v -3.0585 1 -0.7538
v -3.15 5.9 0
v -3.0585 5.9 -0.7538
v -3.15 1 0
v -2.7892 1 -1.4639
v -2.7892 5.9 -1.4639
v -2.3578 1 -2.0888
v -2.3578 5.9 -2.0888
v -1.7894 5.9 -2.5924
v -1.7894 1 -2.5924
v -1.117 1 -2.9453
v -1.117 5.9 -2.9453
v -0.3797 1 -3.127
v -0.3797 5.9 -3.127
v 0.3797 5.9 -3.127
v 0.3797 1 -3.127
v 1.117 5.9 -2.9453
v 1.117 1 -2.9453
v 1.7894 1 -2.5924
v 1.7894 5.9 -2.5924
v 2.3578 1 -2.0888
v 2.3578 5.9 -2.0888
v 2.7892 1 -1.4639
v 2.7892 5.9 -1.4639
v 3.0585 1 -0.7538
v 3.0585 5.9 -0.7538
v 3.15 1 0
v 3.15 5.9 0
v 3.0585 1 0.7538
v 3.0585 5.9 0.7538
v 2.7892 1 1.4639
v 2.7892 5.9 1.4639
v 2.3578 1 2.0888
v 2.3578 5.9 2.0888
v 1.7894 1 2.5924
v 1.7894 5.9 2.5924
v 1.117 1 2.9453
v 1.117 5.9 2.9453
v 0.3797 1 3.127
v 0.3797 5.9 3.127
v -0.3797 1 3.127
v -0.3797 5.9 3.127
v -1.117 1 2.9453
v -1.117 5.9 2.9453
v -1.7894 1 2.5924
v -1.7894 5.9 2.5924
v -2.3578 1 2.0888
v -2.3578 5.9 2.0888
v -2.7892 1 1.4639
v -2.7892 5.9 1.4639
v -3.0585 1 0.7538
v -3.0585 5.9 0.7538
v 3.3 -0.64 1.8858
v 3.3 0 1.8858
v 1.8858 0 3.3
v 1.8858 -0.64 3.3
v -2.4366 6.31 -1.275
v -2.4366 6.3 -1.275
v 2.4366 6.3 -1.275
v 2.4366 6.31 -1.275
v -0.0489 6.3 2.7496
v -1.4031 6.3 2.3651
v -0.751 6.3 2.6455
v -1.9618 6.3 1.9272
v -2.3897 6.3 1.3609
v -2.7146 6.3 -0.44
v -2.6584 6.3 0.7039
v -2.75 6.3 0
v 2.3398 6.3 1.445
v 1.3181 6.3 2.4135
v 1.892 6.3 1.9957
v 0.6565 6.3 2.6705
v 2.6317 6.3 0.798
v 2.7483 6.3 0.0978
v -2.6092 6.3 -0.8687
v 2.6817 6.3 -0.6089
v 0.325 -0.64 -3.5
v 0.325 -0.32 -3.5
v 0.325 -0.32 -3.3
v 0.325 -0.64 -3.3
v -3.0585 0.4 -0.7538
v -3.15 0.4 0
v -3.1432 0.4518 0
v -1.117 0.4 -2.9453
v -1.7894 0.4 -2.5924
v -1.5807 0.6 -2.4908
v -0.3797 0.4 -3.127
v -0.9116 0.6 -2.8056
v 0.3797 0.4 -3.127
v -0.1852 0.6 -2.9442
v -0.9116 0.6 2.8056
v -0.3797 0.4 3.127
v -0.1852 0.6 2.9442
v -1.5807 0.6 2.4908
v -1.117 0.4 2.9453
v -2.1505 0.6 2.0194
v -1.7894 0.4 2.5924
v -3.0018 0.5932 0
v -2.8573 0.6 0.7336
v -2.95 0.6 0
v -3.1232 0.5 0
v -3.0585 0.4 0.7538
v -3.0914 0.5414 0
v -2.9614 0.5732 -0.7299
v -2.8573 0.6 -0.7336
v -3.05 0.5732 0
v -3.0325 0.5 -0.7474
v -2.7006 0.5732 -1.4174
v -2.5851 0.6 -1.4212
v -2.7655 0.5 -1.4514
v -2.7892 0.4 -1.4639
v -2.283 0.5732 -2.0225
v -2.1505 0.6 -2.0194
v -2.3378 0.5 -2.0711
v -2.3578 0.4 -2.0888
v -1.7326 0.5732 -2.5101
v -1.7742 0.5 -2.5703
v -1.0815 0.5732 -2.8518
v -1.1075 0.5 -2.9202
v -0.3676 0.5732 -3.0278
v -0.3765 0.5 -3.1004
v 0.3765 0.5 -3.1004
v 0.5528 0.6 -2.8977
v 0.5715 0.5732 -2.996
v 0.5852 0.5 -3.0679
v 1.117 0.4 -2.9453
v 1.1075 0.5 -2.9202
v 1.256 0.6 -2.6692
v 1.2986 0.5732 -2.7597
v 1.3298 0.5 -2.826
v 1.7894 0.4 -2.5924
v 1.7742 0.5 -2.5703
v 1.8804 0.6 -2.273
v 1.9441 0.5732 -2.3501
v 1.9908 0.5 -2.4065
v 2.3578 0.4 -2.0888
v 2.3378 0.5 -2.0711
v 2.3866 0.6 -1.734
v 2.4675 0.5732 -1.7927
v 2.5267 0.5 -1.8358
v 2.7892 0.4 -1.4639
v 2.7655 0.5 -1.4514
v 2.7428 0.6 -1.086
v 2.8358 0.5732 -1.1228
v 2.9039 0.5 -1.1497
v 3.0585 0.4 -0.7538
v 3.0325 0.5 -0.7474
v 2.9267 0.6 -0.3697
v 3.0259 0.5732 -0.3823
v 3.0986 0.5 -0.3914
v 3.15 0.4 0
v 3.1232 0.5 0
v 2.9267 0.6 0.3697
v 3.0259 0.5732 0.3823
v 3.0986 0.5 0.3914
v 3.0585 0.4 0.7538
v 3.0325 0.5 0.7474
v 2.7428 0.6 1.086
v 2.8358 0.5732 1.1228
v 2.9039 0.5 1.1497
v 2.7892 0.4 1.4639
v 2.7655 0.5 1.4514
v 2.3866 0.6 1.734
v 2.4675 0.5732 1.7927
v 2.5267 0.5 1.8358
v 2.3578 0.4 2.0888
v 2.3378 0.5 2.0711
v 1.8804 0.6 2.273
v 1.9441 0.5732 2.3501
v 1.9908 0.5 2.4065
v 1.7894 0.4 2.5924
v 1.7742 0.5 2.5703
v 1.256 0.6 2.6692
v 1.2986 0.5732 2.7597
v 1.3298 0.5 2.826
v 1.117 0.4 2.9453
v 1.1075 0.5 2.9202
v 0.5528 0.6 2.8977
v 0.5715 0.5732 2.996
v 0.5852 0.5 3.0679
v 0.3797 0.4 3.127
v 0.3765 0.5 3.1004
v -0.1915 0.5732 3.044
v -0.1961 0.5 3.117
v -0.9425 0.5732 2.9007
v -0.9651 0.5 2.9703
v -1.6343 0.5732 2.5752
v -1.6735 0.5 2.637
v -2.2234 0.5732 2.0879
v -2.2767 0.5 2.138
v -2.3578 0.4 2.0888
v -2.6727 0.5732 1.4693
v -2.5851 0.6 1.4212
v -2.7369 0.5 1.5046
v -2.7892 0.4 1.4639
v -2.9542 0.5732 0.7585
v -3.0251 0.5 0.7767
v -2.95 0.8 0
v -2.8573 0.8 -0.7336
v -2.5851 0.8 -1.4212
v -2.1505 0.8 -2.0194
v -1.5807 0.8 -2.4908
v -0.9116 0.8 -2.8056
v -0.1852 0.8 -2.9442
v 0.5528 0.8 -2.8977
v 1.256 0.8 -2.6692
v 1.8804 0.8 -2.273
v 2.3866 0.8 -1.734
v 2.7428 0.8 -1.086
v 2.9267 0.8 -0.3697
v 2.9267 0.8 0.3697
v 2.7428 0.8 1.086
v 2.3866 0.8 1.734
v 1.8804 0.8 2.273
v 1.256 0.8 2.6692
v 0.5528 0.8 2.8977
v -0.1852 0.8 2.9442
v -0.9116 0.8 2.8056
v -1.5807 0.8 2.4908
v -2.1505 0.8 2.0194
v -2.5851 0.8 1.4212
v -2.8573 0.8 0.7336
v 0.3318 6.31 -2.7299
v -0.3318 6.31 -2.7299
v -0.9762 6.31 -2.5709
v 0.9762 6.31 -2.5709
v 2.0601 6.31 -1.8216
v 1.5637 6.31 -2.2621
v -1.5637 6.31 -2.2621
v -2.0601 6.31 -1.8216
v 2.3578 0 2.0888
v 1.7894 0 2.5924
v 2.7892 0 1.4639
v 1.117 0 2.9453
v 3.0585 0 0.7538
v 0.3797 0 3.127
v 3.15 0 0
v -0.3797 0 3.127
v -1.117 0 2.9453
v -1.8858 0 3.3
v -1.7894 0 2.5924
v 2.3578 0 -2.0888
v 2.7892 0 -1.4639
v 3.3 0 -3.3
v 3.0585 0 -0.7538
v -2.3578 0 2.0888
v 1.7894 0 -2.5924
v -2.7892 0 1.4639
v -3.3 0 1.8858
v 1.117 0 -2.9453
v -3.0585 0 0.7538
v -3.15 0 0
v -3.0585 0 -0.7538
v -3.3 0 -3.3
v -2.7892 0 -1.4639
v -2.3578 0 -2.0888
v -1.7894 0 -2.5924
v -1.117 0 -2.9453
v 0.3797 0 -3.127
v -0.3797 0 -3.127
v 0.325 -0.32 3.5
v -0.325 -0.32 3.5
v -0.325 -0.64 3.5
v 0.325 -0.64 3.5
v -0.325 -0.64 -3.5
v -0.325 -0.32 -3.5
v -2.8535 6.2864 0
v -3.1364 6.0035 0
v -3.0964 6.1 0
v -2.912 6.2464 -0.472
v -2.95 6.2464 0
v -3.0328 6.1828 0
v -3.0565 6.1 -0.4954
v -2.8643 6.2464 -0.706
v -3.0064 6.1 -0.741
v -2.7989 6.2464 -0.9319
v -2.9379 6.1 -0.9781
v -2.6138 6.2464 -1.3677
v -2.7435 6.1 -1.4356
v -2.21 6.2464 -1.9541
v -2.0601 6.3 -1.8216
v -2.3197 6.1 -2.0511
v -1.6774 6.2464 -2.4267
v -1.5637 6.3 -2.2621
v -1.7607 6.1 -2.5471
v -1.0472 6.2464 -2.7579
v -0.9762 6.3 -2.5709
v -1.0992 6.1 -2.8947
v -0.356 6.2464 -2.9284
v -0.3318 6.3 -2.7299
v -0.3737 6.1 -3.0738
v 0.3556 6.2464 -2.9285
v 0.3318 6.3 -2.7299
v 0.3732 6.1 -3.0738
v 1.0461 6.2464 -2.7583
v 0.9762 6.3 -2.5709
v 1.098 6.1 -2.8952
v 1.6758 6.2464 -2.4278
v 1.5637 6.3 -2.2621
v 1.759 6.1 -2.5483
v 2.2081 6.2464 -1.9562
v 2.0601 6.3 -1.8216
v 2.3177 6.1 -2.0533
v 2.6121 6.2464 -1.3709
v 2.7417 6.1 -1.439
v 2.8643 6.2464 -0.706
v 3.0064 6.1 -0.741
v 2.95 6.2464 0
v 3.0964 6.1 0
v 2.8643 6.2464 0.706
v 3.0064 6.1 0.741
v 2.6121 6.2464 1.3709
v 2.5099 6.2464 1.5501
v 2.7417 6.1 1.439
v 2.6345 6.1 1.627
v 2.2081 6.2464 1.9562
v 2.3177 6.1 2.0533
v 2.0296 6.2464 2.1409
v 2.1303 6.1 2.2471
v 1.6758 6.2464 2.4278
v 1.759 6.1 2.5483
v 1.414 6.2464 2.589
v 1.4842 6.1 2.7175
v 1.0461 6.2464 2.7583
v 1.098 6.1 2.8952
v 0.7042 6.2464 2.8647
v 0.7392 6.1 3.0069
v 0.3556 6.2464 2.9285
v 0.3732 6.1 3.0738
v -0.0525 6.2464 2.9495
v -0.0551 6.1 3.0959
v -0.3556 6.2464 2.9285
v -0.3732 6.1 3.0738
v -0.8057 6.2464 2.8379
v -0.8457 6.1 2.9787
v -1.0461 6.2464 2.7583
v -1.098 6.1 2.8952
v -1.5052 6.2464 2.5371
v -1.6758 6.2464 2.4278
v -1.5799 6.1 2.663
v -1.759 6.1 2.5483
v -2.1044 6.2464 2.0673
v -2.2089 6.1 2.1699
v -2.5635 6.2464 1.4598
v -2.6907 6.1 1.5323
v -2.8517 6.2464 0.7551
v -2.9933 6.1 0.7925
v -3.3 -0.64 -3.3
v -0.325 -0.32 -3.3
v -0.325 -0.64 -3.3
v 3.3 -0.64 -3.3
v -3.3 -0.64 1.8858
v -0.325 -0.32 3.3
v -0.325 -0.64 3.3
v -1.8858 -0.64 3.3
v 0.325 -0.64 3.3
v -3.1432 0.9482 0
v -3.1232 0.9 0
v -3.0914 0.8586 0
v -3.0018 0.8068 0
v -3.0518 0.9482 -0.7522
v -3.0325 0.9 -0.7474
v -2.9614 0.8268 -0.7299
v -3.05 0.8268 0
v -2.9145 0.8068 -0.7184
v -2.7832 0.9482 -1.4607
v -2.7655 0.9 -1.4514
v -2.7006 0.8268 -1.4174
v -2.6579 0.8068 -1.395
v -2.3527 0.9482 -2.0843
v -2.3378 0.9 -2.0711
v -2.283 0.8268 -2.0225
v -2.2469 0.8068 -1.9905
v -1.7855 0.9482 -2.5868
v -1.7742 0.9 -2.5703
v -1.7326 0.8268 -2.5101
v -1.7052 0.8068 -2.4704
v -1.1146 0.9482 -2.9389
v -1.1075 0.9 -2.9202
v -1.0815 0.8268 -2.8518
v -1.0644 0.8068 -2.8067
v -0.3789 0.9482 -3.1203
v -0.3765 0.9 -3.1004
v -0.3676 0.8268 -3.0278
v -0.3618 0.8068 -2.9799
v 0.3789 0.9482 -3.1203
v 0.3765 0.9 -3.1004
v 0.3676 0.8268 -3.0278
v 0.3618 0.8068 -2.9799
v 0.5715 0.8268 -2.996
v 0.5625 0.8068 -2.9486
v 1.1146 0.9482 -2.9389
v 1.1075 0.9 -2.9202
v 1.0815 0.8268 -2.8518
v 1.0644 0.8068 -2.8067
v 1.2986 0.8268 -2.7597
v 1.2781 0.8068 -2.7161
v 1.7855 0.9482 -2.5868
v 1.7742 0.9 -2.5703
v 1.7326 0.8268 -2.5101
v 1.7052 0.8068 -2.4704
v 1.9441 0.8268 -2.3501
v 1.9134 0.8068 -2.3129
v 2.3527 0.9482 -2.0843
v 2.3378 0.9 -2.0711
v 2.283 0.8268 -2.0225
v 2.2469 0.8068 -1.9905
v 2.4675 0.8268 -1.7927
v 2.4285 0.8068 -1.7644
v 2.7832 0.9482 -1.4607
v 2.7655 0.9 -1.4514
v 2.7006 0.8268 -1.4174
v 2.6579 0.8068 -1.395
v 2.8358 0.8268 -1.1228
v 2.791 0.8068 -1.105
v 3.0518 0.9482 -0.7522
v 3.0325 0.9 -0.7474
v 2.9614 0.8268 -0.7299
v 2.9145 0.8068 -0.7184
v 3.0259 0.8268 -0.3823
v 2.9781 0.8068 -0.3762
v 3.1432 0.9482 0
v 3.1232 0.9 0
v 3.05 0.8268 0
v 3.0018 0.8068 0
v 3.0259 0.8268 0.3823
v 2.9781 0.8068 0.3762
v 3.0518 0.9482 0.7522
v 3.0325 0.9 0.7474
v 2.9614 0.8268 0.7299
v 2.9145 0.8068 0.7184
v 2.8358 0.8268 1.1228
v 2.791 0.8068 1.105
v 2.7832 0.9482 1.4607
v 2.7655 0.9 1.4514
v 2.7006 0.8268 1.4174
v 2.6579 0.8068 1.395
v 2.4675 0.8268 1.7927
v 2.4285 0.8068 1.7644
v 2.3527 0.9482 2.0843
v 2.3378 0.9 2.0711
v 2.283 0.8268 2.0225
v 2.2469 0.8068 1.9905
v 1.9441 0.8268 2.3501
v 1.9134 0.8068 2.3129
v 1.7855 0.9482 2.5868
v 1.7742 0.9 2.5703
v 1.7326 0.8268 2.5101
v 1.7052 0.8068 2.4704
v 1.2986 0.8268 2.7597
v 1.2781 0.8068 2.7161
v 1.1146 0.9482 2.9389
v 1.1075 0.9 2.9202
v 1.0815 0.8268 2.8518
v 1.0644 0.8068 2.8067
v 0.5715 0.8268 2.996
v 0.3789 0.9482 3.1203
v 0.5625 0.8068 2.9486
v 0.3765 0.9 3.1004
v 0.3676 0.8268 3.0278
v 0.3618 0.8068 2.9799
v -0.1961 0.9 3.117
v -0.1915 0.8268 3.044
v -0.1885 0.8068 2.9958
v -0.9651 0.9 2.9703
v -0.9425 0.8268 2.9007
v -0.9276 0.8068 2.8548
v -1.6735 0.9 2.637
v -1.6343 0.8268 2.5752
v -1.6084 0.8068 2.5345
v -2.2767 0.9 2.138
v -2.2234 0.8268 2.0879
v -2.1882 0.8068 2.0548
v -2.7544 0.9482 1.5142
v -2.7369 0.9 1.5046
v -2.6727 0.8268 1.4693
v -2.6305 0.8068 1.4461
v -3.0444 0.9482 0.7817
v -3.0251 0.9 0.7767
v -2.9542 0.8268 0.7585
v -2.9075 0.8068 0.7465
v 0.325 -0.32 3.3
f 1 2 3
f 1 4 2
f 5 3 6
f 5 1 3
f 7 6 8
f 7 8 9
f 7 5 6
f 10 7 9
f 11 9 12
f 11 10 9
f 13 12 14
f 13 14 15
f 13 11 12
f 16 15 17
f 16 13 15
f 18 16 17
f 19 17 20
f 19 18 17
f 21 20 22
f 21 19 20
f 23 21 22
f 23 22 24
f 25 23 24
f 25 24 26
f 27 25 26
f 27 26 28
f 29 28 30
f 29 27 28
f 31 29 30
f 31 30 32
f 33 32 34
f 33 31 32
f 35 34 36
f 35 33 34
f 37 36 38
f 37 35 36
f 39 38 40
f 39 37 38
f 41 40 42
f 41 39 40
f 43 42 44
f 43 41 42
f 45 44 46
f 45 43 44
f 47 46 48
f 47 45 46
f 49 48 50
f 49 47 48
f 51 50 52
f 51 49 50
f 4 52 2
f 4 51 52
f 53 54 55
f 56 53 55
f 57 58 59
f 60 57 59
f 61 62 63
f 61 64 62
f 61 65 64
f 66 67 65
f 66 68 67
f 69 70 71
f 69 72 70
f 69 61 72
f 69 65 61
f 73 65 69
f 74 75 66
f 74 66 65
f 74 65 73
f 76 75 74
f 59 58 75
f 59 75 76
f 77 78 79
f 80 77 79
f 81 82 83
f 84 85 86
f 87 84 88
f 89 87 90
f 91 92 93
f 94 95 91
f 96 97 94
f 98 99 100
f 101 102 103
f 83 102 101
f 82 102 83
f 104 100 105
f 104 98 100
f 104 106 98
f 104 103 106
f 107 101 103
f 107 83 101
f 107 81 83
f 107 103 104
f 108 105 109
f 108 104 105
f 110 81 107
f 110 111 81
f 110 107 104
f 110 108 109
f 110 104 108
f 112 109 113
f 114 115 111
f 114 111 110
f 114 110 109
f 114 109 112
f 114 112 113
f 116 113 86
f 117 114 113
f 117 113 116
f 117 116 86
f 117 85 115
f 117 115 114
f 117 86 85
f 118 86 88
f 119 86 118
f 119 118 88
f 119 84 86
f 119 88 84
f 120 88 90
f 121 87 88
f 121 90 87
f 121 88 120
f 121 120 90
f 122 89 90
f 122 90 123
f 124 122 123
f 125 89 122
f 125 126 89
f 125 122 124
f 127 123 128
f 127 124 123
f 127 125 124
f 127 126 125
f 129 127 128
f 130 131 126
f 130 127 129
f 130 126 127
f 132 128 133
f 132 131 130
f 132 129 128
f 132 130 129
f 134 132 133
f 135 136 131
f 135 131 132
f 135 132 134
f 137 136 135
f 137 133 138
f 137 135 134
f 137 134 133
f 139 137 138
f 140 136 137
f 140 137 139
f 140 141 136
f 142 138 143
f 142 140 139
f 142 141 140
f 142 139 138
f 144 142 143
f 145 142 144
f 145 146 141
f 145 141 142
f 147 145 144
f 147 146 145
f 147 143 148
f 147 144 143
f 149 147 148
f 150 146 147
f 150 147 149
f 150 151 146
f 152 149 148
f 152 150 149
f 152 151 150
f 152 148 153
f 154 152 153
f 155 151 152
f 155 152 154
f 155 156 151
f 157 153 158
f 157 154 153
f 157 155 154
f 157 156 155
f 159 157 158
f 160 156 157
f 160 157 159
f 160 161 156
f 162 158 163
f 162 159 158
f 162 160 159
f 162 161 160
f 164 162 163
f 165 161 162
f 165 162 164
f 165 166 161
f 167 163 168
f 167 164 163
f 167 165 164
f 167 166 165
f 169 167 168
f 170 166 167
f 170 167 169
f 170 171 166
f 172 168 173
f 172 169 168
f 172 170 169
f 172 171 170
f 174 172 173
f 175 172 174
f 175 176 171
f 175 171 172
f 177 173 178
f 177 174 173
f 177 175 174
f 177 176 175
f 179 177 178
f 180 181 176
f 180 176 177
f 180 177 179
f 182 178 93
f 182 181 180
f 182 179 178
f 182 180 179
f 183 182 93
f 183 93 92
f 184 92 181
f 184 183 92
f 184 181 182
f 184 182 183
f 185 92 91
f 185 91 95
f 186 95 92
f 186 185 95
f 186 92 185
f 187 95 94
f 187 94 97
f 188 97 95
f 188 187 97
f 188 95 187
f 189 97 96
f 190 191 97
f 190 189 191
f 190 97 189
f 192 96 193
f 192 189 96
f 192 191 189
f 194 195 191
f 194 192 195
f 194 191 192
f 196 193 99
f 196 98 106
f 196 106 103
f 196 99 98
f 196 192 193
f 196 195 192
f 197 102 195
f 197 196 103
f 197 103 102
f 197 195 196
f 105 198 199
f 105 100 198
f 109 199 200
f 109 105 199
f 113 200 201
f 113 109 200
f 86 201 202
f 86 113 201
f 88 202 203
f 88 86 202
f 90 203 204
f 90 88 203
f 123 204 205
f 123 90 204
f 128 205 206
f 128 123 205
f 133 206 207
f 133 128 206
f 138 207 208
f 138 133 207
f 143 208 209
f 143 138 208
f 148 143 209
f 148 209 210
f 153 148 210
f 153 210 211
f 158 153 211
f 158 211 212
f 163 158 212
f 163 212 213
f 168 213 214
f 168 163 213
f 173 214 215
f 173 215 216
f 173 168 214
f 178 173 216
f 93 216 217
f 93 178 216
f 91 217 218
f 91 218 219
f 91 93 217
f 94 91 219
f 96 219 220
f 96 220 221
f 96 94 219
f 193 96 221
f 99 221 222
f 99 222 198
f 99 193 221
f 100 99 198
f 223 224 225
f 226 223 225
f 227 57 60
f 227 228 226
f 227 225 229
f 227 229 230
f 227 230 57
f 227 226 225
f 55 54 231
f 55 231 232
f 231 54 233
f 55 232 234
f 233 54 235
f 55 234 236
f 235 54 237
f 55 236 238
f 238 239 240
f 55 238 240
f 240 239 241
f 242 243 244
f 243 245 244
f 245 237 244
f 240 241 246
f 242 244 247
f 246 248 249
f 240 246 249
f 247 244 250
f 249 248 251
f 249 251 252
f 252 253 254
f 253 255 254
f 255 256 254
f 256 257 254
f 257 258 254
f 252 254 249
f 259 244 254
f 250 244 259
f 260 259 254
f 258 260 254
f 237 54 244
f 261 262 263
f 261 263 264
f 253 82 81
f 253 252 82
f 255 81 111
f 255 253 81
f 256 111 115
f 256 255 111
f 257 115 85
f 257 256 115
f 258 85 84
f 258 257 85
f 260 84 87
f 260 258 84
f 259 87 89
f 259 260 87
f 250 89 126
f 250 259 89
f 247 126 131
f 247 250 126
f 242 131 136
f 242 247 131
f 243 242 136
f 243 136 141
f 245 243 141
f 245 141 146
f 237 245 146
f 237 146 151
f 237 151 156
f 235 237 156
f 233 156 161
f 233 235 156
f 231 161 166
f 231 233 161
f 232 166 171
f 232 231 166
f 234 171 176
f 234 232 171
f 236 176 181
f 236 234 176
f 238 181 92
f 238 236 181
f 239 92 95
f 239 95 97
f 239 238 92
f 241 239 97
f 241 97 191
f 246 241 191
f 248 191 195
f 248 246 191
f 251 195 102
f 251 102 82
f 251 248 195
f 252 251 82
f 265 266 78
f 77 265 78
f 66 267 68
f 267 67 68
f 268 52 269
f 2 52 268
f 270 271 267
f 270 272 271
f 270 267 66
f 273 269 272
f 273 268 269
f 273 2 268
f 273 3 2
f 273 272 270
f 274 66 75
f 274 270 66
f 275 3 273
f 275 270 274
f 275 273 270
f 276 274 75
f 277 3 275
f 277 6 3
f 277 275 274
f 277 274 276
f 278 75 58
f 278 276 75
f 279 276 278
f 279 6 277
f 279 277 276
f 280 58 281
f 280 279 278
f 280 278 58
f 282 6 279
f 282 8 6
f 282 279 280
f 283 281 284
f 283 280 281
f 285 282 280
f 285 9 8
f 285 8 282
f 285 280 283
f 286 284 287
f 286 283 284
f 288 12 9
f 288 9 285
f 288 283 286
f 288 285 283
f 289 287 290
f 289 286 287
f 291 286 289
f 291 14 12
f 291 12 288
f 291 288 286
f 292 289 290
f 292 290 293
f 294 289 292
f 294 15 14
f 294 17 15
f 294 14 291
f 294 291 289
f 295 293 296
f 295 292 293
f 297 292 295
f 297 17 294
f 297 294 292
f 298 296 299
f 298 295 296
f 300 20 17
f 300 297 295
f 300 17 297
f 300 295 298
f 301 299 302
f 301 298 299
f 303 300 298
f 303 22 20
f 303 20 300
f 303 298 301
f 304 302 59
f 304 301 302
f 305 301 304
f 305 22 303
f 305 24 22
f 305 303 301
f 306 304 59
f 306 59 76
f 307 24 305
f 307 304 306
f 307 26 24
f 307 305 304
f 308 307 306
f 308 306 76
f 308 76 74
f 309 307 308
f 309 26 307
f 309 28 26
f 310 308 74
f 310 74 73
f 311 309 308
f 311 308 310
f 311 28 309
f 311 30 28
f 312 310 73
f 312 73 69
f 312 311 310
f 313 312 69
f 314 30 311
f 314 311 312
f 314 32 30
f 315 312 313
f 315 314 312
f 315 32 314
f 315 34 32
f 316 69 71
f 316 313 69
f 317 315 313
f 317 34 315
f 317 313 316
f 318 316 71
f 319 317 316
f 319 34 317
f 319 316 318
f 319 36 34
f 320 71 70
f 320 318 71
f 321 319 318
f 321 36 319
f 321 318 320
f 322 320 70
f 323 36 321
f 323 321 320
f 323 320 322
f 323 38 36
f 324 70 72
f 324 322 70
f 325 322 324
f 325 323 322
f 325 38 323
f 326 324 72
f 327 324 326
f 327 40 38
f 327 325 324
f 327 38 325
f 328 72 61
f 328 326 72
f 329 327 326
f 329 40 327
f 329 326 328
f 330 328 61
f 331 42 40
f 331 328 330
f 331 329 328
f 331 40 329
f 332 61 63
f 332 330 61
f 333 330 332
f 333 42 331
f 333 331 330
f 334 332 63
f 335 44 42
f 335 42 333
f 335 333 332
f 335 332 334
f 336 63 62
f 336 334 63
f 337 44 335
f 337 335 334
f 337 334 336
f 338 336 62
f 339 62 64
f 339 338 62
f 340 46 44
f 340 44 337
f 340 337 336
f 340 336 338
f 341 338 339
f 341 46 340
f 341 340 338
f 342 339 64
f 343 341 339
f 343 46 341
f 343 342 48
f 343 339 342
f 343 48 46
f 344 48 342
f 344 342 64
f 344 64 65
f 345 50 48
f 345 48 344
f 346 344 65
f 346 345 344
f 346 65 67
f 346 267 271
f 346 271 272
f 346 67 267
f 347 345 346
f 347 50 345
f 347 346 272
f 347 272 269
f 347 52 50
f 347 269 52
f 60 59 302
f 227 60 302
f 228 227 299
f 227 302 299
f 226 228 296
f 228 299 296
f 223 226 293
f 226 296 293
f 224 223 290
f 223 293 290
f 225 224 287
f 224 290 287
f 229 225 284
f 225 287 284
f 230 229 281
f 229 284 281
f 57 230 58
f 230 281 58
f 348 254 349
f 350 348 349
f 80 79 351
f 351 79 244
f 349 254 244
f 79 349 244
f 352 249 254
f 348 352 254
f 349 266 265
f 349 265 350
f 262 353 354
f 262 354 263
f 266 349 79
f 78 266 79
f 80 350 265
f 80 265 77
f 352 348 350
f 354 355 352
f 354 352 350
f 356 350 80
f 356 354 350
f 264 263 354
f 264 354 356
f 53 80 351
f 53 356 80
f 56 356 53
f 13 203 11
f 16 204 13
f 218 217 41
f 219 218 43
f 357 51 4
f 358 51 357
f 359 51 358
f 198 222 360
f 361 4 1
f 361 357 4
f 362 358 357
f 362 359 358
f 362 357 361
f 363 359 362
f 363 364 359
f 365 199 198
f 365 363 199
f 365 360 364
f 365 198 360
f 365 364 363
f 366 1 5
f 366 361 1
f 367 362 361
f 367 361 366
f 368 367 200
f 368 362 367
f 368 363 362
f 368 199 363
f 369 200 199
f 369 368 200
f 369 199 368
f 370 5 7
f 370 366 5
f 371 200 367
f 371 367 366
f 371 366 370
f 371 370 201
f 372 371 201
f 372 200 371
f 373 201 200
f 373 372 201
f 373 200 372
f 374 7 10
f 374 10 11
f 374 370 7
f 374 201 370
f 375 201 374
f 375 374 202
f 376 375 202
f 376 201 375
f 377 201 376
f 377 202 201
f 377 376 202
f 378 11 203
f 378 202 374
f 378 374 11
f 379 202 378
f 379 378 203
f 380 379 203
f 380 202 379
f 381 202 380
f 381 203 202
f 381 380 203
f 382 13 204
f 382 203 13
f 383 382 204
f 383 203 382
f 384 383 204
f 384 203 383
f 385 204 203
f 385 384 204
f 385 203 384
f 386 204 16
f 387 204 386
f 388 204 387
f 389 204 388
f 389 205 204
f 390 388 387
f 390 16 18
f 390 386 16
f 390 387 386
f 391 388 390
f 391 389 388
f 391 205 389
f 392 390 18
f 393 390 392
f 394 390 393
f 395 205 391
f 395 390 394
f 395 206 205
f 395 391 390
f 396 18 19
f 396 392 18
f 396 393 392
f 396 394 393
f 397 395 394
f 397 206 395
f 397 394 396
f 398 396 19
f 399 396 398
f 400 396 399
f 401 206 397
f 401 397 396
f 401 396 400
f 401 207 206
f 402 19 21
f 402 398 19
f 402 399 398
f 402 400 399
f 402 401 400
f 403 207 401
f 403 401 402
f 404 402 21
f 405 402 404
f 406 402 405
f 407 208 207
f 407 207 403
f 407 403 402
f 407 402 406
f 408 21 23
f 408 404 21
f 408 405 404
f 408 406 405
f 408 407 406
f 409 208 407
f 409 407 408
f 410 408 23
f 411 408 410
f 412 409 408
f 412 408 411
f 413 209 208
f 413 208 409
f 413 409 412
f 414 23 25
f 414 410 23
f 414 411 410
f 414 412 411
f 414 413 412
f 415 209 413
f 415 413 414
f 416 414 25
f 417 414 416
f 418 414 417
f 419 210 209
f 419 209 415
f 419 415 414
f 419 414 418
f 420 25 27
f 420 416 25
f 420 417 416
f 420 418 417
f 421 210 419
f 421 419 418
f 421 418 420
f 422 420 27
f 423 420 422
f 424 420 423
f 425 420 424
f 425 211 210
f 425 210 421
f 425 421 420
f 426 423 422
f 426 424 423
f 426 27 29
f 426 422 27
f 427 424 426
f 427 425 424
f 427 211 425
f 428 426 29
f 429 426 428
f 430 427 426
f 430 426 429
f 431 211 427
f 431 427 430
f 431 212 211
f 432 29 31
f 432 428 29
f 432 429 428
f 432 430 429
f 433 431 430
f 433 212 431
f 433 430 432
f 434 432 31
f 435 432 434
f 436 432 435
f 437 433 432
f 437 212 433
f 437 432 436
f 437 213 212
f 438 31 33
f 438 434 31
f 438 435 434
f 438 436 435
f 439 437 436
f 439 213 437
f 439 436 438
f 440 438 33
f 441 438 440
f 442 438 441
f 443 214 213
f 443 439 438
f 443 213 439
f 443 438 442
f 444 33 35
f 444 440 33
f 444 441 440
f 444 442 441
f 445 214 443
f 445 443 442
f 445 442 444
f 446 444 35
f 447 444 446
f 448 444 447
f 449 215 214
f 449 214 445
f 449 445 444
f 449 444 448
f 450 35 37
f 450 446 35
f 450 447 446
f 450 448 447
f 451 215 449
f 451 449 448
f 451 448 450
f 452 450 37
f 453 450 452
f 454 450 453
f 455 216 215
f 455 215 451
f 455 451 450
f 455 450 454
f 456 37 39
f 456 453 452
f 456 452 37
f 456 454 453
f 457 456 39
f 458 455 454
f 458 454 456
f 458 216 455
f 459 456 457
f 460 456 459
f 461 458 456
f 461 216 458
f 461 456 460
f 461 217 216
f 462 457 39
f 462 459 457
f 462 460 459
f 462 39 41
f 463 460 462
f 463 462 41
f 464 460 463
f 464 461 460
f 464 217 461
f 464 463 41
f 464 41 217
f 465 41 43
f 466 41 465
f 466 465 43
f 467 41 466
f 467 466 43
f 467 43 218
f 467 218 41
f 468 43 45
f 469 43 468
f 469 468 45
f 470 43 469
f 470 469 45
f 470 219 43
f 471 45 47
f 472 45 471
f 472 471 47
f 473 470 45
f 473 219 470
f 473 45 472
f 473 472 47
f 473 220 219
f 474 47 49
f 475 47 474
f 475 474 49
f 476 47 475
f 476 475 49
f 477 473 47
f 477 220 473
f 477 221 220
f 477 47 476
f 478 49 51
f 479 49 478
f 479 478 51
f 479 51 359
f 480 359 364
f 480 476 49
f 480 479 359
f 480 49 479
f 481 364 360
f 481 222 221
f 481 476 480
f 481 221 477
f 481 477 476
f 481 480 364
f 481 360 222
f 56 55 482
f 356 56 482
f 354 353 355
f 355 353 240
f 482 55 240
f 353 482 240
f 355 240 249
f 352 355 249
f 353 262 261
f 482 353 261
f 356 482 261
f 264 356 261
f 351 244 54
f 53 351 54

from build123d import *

# Parameters (mm, degrees)
BOSS_EXTRUDE1_DEPTH = 0.01
BOSS_EXTRUDE2_DEPTH = 0.64
CUT_EXTRUDE1_START  = 0.64
CUT_EXTRUDE1_DEPTH  = 0.32
SKETCH4_W           = 0.65
SKETCH4_H           = 2.6
BOSS_EXTRUDE3_DEPTH = 0.32


with BuildPart() as part:
    # Sketch1 → Revolve1 (revolve)
    with BuildSketch(Plane.XY):
        with BuildLine():
            Line((0, 6.3), (-2.75, 6.3))
            ThreePointArc((-2.75, 6.3), (-3.032842712, 6.182842712), (-3.15, 5.9))
            Line((-3.15, 5.9), (-3.15, 1))
            ThreePointArc((-3.15, 1), (-3.091421356, 0.858578644), (-2.95, 0.8))
            Line((-2.95, 0.8), (-2.95, 0.6))
            ThreePointArc((-2.95, 0.6), (-3.091421356, 0.541421356), (-3.15, 0.4))
            Line((-3.15, 0.4), (-3.15, 0))
            Line((-3.15, 0), (0, 0))
            Line((0, 0), (0, 6.3))
        make_face()
    revolve(axis=Axis((0, 8.082229881, 0), (0, -1, 0)))

    # Sketch2 → Boss-Extrude1 (add)
    with BuildSketch(Plane(origin=(0, 6.3, 0), x_dir=(1, 0, 0), z_dir=(0, 1, 0))):
        with BuildLine():
            Line((-2.436570336, 1.275), (2.436570336, 1.275))
            ThreePointArc((2.436570336, 1.275), (0, 2.75), (-2.436570336, 1.275))
        make_face()
    extrude(amount=BOSS_EXTRUDE1_DEPTH)

    # Sketch3 → Boss-Extrude2 (add)
    with BuildSketch(Plane(origin=(0, 0, 0), x_dir=(-1, 0, 0), z_dir=(0, -1, 0))):
        Polygon((1.885786438, -3.3), (3.3, -1.885786438), (3.3, 3.3), (-3.3, 3.3), (-3.3, -1.885786438), (-1.885786438, -3.3), align=None)
    extrude(amount=BOSS_EXTRUDE2_DEPTH)

    # Sketch3<3> → Cut-Extrude1 (cut)
    with BuildSketch(Plane(origin=(0, 0, 0), x_dir=(-1, 0, 0), z_dir=(0, -1, 0)).offset(CUT_EXTRUDE1_START)):
        with BuildLine():
            Line((0.325, 0.9), (0.325, 3.13318927))
            ThreePointArc((0.325, 3.13318927), (0, 3.15), (-0.325, 3.13318927))
            Line((-0.325, 3.13318927), (-0.325, 0.9))
            Line((-0.325, 0.9), (0.325, 0.9))
        make_face()
        with BuildLine():
            ThreePointArc((-0.325, -3.13318927), (0, -3.15), (0.325, -3.13318927))
            Line((0.325, -3.13318927), (0.325, -0.9))
            Line((0.325, -0.9), (-0.325, -0.9))
            Line((-0.325, -0.9), (-0.325, -3.13318927))
        make_face()
        with BuildLine():
            Line((0.325, 3.13318927), (0.325, 3.3))
            Line((0.325, 3.3), (-0.325, 3.3))
            Line((-0.325, 3.3), (-0.325, 3.13318927))
            ThreePointArc((-0.325, 3.13318927), (0, 3.15), (0.325, 3.13318927))
        make_face()
        with BuildLine():
            Line((-0.325, -3.3), (0.325, -3.3))
            Line((0.325, -3.3), (0.325, -3.13318927))
            ThreePointArc((0.325, -3.13318927), (0, -3.15), (-0.325, -3.13318927))
            Line((-0.325, -3.13318927), (-0.325, -3.3))
        make_face()
    extrude(amount=-CUT_EXTRUDE1_DEPTH, mode=Mode.SUBTRACT)

    # Sketch4 → Boss-Extrude3 (add)
    with BuildSketch(Plane.XZ.offset(0.32)):
        with Locations((0, -2.2)):
            Rectangle(SKETCH4_W, SKETCH4_H)
        with Locations((0, 2.2)):
            Rectangle(SKETCH4_W, SKETCH4_H)
    extrude(amount=BOSS_EXTRUDE3_DEPTH)


solid = part.part
